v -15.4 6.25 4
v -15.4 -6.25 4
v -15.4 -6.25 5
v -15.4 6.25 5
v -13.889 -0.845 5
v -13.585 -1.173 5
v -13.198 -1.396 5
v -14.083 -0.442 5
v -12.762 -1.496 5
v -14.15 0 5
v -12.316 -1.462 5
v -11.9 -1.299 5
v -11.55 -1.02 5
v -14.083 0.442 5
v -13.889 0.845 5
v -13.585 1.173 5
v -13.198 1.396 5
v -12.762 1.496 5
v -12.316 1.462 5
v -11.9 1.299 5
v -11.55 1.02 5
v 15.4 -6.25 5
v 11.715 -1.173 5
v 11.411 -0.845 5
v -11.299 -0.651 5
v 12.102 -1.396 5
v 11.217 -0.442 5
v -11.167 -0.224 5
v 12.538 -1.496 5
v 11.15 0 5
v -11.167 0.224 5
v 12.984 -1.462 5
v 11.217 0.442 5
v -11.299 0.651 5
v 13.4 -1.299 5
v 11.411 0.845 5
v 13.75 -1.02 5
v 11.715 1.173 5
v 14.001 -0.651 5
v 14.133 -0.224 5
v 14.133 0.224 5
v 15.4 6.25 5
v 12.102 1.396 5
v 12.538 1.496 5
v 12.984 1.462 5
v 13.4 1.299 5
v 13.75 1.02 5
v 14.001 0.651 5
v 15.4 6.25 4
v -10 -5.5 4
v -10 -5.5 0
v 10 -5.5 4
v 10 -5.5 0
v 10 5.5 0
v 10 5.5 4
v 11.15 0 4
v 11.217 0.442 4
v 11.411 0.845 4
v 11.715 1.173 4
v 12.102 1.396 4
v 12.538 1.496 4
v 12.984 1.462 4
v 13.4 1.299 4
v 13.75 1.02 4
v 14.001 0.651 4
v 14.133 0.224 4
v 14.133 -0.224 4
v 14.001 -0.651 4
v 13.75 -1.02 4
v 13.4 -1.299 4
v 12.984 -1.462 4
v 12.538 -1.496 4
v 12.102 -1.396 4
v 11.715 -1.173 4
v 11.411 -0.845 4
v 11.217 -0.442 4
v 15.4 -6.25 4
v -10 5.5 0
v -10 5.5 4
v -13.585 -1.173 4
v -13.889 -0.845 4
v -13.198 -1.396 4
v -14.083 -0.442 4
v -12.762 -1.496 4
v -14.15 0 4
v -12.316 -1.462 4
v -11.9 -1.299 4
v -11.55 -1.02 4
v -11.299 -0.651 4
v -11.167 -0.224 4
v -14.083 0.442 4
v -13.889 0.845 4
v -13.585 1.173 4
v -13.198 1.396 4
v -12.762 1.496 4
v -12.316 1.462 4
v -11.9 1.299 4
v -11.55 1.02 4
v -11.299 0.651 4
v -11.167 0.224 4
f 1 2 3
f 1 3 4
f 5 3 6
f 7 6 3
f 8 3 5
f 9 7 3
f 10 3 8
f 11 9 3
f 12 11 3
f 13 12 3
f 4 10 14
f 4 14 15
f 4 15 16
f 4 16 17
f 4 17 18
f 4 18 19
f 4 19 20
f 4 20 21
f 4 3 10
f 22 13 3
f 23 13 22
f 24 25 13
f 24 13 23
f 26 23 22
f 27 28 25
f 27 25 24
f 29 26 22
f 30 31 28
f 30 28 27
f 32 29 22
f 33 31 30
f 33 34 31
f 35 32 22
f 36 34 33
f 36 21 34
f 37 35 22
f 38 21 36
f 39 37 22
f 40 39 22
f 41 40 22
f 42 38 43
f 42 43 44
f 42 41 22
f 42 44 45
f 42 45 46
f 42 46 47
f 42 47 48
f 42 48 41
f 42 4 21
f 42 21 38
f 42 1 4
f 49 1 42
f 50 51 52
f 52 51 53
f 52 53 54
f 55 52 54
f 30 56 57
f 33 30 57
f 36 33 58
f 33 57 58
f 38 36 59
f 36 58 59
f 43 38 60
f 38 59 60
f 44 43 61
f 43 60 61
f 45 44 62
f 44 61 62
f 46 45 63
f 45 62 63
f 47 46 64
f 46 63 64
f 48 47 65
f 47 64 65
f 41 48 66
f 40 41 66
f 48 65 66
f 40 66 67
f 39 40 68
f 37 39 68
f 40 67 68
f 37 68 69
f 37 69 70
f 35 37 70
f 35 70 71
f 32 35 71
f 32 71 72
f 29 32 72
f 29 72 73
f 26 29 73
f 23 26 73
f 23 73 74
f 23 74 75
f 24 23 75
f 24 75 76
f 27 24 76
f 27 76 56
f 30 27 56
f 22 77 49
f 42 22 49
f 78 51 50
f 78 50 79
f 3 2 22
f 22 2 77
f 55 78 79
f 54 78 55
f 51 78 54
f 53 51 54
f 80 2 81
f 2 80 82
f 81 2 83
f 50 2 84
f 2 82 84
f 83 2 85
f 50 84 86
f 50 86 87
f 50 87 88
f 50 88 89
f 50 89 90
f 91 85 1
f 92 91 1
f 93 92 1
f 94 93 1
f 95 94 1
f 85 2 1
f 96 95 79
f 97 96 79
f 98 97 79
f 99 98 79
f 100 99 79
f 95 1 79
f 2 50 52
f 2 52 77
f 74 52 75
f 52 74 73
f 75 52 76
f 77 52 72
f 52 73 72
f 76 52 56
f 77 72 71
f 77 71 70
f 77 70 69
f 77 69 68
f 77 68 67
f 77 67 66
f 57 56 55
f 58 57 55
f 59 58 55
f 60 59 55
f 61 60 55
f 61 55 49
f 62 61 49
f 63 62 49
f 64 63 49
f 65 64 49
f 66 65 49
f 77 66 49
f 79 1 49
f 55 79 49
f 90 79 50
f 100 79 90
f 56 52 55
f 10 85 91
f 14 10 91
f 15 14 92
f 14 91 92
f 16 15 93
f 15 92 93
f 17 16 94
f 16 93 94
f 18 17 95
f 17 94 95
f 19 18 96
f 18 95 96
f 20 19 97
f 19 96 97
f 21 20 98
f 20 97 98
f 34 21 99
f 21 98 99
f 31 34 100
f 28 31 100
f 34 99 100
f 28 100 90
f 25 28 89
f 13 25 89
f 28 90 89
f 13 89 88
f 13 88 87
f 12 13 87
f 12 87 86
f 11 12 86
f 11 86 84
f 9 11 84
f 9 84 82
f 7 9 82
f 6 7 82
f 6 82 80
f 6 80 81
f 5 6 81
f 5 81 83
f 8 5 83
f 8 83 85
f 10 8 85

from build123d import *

# Parameters (mm, degrees)
SKETCH1_W                = 20
SKETCH1_H                = 11
BOSS_EXTRUDE1_DEPTH      = 4
SKETCH2_W                = 30.8
SKETCH2_H                = 12.5
BOSS_EXTRUDE2_DEPTH      = 1
F_3_0_3_DIAMETER_HOLE1_D = 3


with BuildPart() as part:
    # Sketch1 → Boss-Extrude1 (new body)
    with BuildSketch(Plane.XY):
        Rectangle(SKETCH1_W, SKETCH1_H)
    extrude(amount=BOSS_EXTRUDE1_DEPTH)

    # Sketch2 → Boss-Extrude2 (add)
    with BuildSketch(Plane.XY.offset(4)):
        Rectangle(SKETCH2_W, SKETCH2_H)
    extrude(amount=BOSS_EXTRUDE2_DEPTH)

    # Ø3.0 (3) Diameter Hole1 (through all)
    with Locations(Plane.XY.offset(5)):
        with Locations((-12.65, 0), (12.65, 0)):
            Hole(F_3_0_3_DIAMETER_HOLE1_D / 2)


solid = part.part
